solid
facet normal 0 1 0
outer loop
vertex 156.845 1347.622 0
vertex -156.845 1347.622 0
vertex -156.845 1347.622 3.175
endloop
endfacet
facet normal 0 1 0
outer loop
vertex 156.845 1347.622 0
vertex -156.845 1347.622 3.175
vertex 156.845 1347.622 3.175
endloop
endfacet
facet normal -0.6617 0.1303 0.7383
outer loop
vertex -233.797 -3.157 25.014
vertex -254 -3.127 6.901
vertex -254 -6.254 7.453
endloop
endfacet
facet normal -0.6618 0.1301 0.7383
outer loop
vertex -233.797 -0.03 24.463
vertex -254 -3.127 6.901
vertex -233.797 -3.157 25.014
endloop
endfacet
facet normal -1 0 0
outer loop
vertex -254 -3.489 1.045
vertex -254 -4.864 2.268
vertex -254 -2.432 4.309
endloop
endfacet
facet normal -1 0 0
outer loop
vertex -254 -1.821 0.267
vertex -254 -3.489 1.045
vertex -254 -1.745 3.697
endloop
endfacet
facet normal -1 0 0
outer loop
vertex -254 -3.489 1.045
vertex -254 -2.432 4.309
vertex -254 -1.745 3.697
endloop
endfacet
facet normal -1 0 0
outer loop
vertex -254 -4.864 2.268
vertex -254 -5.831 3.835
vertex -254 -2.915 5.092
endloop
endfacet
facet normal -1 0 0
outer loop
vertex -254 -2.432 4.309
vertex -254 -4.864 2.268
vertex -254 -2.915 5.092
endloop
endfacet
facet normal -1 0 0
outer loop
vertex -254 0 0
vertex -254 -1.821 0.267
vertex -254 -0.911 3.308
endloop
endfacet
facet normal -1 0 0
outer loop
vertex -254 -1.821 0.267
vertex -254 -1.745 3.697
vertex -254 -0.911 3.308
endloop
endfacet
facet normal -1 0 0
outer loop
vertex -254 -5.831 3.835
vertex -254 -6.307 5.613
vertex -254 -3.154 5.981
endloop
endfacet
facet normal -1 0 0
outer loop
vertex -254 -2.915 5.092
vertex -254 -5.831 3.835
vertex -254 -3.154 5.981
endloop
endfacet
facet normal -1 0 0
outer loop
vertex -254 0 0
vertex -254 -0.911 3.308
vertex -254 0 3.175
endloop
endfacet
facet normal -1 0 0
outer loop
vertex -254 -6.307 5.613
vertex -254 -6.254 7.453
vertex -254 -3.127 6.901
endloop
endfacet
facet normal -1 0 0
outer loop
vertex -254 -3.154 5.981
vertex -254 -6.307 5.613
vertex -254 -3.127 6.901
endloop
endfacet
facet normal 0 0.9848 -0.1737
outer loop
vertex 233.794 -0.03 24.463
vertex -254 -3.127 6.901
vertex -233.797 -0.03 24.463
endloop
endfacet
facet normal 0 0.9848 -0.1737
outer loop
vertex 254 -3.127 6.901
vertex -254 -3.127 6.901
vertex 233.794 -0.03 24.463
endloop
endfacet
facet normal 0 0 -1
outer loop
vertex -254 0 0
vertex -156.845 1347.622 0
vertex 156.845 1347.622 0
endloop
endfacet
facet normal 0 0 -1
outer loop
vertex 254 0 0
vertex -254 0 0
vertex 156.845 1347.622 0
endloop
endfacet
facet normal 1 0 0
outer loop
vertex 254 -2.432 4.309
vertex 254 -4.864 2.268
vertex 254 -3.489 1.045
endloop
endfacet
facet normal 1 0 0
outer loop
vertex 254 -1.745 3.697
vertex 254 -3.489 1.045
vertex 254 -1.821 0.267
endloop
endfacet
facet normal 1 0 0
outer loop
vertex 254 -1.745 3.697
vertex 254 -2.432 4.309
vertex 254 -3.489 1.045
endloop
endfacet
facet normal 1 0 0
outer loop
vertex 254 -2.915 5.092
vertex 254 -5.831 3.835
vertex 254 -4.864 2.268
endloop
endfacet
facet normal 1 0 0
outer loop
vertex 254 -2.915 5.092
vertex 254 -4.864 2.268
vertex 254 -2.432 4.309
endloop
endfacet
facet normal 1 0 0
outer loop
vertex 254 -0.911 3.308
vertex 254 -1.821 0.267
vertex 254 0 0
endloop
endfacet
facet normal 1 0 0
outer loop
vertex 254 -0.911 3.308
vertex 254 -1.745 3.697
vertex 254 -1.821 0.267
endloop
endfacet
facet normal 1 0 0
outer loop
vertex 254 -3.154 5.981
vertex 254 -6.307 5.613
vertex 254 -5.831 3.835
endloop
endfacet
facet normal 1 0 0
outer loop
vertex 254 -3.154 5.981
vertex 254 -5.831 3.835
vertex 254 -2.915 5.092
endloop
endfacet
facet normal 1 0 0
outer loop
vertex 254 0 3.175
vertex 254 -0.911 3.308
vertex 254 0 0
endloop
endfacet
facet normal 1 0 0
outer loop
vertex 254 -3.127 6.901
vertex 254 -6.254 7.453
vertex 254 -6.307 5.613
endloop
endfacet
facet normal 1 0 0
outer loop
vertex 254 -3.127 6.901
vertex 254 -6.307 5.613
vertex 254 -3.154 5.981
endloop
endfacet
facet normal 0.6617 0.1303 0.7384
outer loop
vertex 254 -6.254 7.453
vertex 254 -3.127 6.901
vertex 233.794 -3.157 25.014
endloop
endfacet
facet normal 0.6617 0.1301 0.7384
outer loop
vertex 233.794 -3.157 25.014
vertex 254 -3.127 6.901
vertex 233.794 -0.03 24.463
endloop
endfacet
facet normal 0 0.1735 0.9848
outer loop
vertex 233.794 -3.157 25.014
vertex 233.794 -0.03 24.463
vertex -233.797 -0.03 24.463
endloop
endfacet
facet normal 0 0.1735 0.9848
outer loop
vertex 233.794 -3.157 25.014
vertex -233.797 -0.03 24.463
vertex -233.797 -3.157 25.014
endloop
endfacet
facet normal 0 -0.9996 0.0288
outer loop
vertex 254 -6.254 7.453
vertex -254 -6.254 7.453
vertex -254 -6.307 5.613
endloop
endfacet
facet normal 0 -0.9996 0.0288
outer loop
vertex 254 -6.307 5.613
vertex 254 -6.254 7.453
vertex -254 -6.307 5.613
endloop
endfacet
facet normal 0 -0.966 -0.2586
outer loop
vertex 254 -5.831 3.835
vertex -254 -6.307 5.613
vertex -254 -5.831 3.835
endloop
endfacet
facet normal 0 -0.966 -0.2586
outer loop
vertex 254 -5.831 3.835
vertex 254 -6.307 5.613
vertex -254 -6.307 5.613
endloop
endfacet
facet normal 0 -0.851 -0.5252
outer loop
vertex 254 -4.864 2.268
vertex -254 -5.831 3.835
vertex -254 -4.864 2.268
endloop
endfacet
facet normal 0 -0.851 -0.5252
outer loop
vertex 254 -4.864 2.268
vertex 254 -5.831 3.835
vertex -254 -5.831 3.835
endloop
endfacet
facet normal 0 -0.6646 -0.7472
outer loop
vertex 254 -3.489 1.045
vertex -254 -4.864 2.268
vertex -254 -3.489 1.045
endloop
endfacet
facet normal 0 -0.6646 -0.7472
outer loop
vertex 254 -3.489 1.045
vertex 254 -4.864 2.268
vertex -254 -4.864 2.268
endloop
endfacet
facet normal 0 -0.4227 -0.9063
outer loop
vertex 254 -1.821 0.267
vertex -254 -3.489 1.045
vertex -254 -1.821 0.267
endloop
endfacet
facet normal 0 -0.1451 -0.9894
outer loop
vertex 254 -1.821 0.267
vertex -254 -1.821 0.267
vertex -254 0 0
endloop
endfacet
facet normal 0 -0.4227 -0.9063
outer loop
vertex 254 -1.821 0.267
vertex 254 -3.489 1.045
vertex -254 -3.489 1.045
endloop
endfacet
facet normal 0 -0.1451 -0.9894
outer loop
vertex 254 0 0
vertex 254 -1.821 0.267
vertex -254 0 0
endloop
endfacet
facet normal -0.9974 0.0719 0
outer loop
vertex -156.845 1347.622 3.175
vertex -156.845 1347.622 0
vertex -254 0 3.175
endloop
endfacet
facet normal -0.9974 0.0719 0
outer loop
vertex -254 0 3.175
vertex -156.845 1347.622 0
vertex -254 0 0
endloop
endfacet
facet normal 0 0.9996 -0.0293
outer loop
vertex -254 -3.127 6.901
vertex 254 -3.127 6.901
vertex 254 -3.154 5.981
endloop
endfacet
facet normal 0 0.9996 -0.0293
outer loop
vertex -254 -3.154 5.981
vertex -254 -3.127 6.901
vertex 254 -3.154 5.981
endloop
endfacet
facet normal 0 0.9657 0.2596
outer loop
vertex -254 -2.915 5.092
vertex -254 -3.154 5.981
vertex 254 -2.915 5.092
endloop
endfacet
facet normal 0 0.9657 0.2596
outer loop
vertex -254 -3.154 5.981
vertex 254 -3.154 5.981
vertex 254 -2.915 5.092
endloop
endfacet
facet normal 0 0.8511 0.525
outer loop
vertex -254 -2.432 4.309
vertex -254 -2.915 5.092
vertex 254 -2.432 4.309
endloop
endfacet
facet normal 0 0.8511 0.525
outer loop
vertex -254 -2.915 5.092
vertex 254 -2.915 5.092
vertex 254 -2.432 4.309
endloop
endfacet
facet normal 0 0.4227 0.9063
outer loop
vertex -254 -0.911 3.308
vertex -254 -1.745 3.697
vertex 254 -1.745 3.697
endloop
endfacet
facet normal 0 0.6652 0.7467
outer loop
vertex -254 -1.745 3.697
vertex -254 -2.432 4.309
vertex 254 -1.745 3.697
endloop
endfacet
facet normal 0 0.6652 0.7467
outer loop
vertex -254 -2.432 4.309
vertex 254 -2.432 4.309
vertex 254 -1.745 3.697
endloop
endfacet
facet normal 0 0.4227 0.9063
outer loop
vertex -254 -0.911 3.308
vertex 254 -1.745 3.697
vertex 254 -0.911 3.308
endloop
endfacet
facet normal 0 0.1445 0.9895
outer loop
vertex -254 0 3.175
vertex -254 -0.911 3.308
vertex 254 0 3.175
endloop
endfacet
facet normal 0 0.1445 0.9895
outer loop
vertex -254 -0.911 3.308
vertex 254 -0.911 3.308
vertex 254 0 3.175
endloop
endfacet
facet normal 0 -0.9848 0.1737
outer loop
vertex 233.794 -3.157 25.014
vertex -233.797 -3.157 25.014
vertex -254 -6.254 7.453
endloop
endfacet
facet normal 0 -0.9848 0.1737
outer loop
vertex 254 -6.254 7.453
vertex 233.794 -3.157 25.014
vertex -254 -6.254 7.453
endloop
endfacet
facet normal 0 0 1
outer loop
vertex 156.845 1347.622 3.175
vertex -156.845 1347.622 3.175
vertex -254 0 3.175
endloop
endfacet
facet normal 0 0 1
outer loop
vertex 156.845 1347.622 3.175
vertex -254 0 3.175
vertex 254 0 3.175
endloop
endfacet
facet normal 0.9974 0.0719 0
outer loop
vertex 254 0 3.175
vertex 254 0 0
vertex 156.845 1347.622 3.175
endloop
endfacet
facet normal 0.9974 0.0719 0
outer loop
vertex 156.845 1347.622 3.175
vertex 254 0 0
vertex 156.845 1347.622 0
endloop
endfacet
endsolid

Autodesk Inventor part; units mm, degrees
ref_plane "YZ Plane" through (0, 0, 0) normal (1, 0, 0) x (0, 1, 0)
ref_plane "XZ Plane" through (0, 0, 0) normal (0, 1, 0) x (-1, 0, 0)
ref_plane "XY Plane" through (0, 0, 0) normal (0, 0, 1) x (1, 0, 0)
sketch "Sketch1" plane through (0, 0, 0) normal (0, 0, 1) x (1, 0, 0)
  line L0 (-254, 0) -> (254, 0)
  line L1 (-156.845, 1347.6224) -> (156.845, 1347.6224)
  line L2 (-156.845, 1347.6224) -> (-254, 0)
  line L3 (254, 0) -> (156.845, 1347.6224)
  point P0 (0, 0)
  point P1 (0, 0)
  point P2 (0, 1347.6224)
  dimension "d0" = 508
  dimension "d1" = 313.69
  dimension "d2" = 1347.6224
extrude "Plate1" add sketch "Sketch1" along normal blind 3.175
sketch "Sketch3" plane through (254, -3.1268, 6.9013) normal (0, -0.9848078, 0.1736482) x (1, 0, 0)
  line L0 (-508, 0) -> (0, 0)
  line L1 (0, 0) -> (0, 17.8324)
  line L2 (0, 17.8324) -> (-508, 17.8324)
  line L3 (-508, 17.8324) -> (-508, 0)
edge flange "Flange2" height 25.4 angle 100 thickness 3.175 bend radius 3.175 thickness toward (0, -0.9848078, 0.1736482) relief tear relief width 3.175 relief depth 1.5875 edges at (0, 0, 3.175) wall of the first edge with corners at (-254, -3.1268, 6.9013) (254, -3.1268, 6.9013) (254, -0.0302, 24.4628) (-254, -0.0302, 24.4628)
bend "Bend2"
corner "Corner2"
sketch "Sketch4" plane through (-254, -0.0302, 24.4628) normal (0, 0.9848078, -0.1736482) x (1, 0, 0)
  line L0 (508, 17.8324) -> (0, 17.8324) projected
  line L1 (508, 17.8324) -> (487.7938, 0)
  line L2 (0, 0) -> (508, 0) projected
  line L3 (487.7938, 0) -> (508, 0)
  line L4 (508, 0) -> (508, 17.8324) projected
  line L5 (508, 0) -> (508, 17.8324)
  line L6 (508, 17.8324) -> (487.7938, 0)
  point P0 (254, 24.0859)
extrude "Cut1" cut sketch "Sketch4" against normal blind 3.175
sketch "Sketch5" plane through (-254, -3.1268, 6.9013) normal (0, 0.9848078, -0.1736482) x (1, 0, 0)
  line L0 (0, -17.8324) -> (0, 0) projected
  line L1 (0, 0) -> (20.2032, -17.8324)
  line L2 (0, -17.8324) -> (487.7938, -17.8324) projected
  point P0 (254, 6.2535)
extrude "Cut2" cut sketch "Sketch5" against normal blind 3.175
equation "\"d24\" = Thickness"
equation "\"d26\" = Thickness"
equation "\"d14\" = BendReliefWidth"
equation "\"d15\" = BendReliefDepth"
equation "\"d16\" = MinimumRemnant"
equation "\"d17\" = BendRadius"
equation "\"d20\" = BendRadius"
equation "\"d21\" = CornerReliefSize"
equation "\"d22\" = GapSize"
equation "\"d23\" = JacobiRadiusSize"
equation "\"BendRadius\" = Thickness"
equation "\"BendReliefWidth\" = Thickness"
equation "\"BendReliefDepth\" = 0.5 * Thickness"
equation "\"CornerReliefSize\" = 4 * Thickness"
equation "\"MinimumRemnant\" = 2 * Thickness"
equation "\"TransitionRadius\" = BendRadius"
equation "\"JacobiRadiusSize\" = BendRadius"
equation "\"GapSize\" = Thickness"
equation "\"d3\" = BendRadius"
equation "\"Thickness\" = 3.175"
properties part number "robot side"
